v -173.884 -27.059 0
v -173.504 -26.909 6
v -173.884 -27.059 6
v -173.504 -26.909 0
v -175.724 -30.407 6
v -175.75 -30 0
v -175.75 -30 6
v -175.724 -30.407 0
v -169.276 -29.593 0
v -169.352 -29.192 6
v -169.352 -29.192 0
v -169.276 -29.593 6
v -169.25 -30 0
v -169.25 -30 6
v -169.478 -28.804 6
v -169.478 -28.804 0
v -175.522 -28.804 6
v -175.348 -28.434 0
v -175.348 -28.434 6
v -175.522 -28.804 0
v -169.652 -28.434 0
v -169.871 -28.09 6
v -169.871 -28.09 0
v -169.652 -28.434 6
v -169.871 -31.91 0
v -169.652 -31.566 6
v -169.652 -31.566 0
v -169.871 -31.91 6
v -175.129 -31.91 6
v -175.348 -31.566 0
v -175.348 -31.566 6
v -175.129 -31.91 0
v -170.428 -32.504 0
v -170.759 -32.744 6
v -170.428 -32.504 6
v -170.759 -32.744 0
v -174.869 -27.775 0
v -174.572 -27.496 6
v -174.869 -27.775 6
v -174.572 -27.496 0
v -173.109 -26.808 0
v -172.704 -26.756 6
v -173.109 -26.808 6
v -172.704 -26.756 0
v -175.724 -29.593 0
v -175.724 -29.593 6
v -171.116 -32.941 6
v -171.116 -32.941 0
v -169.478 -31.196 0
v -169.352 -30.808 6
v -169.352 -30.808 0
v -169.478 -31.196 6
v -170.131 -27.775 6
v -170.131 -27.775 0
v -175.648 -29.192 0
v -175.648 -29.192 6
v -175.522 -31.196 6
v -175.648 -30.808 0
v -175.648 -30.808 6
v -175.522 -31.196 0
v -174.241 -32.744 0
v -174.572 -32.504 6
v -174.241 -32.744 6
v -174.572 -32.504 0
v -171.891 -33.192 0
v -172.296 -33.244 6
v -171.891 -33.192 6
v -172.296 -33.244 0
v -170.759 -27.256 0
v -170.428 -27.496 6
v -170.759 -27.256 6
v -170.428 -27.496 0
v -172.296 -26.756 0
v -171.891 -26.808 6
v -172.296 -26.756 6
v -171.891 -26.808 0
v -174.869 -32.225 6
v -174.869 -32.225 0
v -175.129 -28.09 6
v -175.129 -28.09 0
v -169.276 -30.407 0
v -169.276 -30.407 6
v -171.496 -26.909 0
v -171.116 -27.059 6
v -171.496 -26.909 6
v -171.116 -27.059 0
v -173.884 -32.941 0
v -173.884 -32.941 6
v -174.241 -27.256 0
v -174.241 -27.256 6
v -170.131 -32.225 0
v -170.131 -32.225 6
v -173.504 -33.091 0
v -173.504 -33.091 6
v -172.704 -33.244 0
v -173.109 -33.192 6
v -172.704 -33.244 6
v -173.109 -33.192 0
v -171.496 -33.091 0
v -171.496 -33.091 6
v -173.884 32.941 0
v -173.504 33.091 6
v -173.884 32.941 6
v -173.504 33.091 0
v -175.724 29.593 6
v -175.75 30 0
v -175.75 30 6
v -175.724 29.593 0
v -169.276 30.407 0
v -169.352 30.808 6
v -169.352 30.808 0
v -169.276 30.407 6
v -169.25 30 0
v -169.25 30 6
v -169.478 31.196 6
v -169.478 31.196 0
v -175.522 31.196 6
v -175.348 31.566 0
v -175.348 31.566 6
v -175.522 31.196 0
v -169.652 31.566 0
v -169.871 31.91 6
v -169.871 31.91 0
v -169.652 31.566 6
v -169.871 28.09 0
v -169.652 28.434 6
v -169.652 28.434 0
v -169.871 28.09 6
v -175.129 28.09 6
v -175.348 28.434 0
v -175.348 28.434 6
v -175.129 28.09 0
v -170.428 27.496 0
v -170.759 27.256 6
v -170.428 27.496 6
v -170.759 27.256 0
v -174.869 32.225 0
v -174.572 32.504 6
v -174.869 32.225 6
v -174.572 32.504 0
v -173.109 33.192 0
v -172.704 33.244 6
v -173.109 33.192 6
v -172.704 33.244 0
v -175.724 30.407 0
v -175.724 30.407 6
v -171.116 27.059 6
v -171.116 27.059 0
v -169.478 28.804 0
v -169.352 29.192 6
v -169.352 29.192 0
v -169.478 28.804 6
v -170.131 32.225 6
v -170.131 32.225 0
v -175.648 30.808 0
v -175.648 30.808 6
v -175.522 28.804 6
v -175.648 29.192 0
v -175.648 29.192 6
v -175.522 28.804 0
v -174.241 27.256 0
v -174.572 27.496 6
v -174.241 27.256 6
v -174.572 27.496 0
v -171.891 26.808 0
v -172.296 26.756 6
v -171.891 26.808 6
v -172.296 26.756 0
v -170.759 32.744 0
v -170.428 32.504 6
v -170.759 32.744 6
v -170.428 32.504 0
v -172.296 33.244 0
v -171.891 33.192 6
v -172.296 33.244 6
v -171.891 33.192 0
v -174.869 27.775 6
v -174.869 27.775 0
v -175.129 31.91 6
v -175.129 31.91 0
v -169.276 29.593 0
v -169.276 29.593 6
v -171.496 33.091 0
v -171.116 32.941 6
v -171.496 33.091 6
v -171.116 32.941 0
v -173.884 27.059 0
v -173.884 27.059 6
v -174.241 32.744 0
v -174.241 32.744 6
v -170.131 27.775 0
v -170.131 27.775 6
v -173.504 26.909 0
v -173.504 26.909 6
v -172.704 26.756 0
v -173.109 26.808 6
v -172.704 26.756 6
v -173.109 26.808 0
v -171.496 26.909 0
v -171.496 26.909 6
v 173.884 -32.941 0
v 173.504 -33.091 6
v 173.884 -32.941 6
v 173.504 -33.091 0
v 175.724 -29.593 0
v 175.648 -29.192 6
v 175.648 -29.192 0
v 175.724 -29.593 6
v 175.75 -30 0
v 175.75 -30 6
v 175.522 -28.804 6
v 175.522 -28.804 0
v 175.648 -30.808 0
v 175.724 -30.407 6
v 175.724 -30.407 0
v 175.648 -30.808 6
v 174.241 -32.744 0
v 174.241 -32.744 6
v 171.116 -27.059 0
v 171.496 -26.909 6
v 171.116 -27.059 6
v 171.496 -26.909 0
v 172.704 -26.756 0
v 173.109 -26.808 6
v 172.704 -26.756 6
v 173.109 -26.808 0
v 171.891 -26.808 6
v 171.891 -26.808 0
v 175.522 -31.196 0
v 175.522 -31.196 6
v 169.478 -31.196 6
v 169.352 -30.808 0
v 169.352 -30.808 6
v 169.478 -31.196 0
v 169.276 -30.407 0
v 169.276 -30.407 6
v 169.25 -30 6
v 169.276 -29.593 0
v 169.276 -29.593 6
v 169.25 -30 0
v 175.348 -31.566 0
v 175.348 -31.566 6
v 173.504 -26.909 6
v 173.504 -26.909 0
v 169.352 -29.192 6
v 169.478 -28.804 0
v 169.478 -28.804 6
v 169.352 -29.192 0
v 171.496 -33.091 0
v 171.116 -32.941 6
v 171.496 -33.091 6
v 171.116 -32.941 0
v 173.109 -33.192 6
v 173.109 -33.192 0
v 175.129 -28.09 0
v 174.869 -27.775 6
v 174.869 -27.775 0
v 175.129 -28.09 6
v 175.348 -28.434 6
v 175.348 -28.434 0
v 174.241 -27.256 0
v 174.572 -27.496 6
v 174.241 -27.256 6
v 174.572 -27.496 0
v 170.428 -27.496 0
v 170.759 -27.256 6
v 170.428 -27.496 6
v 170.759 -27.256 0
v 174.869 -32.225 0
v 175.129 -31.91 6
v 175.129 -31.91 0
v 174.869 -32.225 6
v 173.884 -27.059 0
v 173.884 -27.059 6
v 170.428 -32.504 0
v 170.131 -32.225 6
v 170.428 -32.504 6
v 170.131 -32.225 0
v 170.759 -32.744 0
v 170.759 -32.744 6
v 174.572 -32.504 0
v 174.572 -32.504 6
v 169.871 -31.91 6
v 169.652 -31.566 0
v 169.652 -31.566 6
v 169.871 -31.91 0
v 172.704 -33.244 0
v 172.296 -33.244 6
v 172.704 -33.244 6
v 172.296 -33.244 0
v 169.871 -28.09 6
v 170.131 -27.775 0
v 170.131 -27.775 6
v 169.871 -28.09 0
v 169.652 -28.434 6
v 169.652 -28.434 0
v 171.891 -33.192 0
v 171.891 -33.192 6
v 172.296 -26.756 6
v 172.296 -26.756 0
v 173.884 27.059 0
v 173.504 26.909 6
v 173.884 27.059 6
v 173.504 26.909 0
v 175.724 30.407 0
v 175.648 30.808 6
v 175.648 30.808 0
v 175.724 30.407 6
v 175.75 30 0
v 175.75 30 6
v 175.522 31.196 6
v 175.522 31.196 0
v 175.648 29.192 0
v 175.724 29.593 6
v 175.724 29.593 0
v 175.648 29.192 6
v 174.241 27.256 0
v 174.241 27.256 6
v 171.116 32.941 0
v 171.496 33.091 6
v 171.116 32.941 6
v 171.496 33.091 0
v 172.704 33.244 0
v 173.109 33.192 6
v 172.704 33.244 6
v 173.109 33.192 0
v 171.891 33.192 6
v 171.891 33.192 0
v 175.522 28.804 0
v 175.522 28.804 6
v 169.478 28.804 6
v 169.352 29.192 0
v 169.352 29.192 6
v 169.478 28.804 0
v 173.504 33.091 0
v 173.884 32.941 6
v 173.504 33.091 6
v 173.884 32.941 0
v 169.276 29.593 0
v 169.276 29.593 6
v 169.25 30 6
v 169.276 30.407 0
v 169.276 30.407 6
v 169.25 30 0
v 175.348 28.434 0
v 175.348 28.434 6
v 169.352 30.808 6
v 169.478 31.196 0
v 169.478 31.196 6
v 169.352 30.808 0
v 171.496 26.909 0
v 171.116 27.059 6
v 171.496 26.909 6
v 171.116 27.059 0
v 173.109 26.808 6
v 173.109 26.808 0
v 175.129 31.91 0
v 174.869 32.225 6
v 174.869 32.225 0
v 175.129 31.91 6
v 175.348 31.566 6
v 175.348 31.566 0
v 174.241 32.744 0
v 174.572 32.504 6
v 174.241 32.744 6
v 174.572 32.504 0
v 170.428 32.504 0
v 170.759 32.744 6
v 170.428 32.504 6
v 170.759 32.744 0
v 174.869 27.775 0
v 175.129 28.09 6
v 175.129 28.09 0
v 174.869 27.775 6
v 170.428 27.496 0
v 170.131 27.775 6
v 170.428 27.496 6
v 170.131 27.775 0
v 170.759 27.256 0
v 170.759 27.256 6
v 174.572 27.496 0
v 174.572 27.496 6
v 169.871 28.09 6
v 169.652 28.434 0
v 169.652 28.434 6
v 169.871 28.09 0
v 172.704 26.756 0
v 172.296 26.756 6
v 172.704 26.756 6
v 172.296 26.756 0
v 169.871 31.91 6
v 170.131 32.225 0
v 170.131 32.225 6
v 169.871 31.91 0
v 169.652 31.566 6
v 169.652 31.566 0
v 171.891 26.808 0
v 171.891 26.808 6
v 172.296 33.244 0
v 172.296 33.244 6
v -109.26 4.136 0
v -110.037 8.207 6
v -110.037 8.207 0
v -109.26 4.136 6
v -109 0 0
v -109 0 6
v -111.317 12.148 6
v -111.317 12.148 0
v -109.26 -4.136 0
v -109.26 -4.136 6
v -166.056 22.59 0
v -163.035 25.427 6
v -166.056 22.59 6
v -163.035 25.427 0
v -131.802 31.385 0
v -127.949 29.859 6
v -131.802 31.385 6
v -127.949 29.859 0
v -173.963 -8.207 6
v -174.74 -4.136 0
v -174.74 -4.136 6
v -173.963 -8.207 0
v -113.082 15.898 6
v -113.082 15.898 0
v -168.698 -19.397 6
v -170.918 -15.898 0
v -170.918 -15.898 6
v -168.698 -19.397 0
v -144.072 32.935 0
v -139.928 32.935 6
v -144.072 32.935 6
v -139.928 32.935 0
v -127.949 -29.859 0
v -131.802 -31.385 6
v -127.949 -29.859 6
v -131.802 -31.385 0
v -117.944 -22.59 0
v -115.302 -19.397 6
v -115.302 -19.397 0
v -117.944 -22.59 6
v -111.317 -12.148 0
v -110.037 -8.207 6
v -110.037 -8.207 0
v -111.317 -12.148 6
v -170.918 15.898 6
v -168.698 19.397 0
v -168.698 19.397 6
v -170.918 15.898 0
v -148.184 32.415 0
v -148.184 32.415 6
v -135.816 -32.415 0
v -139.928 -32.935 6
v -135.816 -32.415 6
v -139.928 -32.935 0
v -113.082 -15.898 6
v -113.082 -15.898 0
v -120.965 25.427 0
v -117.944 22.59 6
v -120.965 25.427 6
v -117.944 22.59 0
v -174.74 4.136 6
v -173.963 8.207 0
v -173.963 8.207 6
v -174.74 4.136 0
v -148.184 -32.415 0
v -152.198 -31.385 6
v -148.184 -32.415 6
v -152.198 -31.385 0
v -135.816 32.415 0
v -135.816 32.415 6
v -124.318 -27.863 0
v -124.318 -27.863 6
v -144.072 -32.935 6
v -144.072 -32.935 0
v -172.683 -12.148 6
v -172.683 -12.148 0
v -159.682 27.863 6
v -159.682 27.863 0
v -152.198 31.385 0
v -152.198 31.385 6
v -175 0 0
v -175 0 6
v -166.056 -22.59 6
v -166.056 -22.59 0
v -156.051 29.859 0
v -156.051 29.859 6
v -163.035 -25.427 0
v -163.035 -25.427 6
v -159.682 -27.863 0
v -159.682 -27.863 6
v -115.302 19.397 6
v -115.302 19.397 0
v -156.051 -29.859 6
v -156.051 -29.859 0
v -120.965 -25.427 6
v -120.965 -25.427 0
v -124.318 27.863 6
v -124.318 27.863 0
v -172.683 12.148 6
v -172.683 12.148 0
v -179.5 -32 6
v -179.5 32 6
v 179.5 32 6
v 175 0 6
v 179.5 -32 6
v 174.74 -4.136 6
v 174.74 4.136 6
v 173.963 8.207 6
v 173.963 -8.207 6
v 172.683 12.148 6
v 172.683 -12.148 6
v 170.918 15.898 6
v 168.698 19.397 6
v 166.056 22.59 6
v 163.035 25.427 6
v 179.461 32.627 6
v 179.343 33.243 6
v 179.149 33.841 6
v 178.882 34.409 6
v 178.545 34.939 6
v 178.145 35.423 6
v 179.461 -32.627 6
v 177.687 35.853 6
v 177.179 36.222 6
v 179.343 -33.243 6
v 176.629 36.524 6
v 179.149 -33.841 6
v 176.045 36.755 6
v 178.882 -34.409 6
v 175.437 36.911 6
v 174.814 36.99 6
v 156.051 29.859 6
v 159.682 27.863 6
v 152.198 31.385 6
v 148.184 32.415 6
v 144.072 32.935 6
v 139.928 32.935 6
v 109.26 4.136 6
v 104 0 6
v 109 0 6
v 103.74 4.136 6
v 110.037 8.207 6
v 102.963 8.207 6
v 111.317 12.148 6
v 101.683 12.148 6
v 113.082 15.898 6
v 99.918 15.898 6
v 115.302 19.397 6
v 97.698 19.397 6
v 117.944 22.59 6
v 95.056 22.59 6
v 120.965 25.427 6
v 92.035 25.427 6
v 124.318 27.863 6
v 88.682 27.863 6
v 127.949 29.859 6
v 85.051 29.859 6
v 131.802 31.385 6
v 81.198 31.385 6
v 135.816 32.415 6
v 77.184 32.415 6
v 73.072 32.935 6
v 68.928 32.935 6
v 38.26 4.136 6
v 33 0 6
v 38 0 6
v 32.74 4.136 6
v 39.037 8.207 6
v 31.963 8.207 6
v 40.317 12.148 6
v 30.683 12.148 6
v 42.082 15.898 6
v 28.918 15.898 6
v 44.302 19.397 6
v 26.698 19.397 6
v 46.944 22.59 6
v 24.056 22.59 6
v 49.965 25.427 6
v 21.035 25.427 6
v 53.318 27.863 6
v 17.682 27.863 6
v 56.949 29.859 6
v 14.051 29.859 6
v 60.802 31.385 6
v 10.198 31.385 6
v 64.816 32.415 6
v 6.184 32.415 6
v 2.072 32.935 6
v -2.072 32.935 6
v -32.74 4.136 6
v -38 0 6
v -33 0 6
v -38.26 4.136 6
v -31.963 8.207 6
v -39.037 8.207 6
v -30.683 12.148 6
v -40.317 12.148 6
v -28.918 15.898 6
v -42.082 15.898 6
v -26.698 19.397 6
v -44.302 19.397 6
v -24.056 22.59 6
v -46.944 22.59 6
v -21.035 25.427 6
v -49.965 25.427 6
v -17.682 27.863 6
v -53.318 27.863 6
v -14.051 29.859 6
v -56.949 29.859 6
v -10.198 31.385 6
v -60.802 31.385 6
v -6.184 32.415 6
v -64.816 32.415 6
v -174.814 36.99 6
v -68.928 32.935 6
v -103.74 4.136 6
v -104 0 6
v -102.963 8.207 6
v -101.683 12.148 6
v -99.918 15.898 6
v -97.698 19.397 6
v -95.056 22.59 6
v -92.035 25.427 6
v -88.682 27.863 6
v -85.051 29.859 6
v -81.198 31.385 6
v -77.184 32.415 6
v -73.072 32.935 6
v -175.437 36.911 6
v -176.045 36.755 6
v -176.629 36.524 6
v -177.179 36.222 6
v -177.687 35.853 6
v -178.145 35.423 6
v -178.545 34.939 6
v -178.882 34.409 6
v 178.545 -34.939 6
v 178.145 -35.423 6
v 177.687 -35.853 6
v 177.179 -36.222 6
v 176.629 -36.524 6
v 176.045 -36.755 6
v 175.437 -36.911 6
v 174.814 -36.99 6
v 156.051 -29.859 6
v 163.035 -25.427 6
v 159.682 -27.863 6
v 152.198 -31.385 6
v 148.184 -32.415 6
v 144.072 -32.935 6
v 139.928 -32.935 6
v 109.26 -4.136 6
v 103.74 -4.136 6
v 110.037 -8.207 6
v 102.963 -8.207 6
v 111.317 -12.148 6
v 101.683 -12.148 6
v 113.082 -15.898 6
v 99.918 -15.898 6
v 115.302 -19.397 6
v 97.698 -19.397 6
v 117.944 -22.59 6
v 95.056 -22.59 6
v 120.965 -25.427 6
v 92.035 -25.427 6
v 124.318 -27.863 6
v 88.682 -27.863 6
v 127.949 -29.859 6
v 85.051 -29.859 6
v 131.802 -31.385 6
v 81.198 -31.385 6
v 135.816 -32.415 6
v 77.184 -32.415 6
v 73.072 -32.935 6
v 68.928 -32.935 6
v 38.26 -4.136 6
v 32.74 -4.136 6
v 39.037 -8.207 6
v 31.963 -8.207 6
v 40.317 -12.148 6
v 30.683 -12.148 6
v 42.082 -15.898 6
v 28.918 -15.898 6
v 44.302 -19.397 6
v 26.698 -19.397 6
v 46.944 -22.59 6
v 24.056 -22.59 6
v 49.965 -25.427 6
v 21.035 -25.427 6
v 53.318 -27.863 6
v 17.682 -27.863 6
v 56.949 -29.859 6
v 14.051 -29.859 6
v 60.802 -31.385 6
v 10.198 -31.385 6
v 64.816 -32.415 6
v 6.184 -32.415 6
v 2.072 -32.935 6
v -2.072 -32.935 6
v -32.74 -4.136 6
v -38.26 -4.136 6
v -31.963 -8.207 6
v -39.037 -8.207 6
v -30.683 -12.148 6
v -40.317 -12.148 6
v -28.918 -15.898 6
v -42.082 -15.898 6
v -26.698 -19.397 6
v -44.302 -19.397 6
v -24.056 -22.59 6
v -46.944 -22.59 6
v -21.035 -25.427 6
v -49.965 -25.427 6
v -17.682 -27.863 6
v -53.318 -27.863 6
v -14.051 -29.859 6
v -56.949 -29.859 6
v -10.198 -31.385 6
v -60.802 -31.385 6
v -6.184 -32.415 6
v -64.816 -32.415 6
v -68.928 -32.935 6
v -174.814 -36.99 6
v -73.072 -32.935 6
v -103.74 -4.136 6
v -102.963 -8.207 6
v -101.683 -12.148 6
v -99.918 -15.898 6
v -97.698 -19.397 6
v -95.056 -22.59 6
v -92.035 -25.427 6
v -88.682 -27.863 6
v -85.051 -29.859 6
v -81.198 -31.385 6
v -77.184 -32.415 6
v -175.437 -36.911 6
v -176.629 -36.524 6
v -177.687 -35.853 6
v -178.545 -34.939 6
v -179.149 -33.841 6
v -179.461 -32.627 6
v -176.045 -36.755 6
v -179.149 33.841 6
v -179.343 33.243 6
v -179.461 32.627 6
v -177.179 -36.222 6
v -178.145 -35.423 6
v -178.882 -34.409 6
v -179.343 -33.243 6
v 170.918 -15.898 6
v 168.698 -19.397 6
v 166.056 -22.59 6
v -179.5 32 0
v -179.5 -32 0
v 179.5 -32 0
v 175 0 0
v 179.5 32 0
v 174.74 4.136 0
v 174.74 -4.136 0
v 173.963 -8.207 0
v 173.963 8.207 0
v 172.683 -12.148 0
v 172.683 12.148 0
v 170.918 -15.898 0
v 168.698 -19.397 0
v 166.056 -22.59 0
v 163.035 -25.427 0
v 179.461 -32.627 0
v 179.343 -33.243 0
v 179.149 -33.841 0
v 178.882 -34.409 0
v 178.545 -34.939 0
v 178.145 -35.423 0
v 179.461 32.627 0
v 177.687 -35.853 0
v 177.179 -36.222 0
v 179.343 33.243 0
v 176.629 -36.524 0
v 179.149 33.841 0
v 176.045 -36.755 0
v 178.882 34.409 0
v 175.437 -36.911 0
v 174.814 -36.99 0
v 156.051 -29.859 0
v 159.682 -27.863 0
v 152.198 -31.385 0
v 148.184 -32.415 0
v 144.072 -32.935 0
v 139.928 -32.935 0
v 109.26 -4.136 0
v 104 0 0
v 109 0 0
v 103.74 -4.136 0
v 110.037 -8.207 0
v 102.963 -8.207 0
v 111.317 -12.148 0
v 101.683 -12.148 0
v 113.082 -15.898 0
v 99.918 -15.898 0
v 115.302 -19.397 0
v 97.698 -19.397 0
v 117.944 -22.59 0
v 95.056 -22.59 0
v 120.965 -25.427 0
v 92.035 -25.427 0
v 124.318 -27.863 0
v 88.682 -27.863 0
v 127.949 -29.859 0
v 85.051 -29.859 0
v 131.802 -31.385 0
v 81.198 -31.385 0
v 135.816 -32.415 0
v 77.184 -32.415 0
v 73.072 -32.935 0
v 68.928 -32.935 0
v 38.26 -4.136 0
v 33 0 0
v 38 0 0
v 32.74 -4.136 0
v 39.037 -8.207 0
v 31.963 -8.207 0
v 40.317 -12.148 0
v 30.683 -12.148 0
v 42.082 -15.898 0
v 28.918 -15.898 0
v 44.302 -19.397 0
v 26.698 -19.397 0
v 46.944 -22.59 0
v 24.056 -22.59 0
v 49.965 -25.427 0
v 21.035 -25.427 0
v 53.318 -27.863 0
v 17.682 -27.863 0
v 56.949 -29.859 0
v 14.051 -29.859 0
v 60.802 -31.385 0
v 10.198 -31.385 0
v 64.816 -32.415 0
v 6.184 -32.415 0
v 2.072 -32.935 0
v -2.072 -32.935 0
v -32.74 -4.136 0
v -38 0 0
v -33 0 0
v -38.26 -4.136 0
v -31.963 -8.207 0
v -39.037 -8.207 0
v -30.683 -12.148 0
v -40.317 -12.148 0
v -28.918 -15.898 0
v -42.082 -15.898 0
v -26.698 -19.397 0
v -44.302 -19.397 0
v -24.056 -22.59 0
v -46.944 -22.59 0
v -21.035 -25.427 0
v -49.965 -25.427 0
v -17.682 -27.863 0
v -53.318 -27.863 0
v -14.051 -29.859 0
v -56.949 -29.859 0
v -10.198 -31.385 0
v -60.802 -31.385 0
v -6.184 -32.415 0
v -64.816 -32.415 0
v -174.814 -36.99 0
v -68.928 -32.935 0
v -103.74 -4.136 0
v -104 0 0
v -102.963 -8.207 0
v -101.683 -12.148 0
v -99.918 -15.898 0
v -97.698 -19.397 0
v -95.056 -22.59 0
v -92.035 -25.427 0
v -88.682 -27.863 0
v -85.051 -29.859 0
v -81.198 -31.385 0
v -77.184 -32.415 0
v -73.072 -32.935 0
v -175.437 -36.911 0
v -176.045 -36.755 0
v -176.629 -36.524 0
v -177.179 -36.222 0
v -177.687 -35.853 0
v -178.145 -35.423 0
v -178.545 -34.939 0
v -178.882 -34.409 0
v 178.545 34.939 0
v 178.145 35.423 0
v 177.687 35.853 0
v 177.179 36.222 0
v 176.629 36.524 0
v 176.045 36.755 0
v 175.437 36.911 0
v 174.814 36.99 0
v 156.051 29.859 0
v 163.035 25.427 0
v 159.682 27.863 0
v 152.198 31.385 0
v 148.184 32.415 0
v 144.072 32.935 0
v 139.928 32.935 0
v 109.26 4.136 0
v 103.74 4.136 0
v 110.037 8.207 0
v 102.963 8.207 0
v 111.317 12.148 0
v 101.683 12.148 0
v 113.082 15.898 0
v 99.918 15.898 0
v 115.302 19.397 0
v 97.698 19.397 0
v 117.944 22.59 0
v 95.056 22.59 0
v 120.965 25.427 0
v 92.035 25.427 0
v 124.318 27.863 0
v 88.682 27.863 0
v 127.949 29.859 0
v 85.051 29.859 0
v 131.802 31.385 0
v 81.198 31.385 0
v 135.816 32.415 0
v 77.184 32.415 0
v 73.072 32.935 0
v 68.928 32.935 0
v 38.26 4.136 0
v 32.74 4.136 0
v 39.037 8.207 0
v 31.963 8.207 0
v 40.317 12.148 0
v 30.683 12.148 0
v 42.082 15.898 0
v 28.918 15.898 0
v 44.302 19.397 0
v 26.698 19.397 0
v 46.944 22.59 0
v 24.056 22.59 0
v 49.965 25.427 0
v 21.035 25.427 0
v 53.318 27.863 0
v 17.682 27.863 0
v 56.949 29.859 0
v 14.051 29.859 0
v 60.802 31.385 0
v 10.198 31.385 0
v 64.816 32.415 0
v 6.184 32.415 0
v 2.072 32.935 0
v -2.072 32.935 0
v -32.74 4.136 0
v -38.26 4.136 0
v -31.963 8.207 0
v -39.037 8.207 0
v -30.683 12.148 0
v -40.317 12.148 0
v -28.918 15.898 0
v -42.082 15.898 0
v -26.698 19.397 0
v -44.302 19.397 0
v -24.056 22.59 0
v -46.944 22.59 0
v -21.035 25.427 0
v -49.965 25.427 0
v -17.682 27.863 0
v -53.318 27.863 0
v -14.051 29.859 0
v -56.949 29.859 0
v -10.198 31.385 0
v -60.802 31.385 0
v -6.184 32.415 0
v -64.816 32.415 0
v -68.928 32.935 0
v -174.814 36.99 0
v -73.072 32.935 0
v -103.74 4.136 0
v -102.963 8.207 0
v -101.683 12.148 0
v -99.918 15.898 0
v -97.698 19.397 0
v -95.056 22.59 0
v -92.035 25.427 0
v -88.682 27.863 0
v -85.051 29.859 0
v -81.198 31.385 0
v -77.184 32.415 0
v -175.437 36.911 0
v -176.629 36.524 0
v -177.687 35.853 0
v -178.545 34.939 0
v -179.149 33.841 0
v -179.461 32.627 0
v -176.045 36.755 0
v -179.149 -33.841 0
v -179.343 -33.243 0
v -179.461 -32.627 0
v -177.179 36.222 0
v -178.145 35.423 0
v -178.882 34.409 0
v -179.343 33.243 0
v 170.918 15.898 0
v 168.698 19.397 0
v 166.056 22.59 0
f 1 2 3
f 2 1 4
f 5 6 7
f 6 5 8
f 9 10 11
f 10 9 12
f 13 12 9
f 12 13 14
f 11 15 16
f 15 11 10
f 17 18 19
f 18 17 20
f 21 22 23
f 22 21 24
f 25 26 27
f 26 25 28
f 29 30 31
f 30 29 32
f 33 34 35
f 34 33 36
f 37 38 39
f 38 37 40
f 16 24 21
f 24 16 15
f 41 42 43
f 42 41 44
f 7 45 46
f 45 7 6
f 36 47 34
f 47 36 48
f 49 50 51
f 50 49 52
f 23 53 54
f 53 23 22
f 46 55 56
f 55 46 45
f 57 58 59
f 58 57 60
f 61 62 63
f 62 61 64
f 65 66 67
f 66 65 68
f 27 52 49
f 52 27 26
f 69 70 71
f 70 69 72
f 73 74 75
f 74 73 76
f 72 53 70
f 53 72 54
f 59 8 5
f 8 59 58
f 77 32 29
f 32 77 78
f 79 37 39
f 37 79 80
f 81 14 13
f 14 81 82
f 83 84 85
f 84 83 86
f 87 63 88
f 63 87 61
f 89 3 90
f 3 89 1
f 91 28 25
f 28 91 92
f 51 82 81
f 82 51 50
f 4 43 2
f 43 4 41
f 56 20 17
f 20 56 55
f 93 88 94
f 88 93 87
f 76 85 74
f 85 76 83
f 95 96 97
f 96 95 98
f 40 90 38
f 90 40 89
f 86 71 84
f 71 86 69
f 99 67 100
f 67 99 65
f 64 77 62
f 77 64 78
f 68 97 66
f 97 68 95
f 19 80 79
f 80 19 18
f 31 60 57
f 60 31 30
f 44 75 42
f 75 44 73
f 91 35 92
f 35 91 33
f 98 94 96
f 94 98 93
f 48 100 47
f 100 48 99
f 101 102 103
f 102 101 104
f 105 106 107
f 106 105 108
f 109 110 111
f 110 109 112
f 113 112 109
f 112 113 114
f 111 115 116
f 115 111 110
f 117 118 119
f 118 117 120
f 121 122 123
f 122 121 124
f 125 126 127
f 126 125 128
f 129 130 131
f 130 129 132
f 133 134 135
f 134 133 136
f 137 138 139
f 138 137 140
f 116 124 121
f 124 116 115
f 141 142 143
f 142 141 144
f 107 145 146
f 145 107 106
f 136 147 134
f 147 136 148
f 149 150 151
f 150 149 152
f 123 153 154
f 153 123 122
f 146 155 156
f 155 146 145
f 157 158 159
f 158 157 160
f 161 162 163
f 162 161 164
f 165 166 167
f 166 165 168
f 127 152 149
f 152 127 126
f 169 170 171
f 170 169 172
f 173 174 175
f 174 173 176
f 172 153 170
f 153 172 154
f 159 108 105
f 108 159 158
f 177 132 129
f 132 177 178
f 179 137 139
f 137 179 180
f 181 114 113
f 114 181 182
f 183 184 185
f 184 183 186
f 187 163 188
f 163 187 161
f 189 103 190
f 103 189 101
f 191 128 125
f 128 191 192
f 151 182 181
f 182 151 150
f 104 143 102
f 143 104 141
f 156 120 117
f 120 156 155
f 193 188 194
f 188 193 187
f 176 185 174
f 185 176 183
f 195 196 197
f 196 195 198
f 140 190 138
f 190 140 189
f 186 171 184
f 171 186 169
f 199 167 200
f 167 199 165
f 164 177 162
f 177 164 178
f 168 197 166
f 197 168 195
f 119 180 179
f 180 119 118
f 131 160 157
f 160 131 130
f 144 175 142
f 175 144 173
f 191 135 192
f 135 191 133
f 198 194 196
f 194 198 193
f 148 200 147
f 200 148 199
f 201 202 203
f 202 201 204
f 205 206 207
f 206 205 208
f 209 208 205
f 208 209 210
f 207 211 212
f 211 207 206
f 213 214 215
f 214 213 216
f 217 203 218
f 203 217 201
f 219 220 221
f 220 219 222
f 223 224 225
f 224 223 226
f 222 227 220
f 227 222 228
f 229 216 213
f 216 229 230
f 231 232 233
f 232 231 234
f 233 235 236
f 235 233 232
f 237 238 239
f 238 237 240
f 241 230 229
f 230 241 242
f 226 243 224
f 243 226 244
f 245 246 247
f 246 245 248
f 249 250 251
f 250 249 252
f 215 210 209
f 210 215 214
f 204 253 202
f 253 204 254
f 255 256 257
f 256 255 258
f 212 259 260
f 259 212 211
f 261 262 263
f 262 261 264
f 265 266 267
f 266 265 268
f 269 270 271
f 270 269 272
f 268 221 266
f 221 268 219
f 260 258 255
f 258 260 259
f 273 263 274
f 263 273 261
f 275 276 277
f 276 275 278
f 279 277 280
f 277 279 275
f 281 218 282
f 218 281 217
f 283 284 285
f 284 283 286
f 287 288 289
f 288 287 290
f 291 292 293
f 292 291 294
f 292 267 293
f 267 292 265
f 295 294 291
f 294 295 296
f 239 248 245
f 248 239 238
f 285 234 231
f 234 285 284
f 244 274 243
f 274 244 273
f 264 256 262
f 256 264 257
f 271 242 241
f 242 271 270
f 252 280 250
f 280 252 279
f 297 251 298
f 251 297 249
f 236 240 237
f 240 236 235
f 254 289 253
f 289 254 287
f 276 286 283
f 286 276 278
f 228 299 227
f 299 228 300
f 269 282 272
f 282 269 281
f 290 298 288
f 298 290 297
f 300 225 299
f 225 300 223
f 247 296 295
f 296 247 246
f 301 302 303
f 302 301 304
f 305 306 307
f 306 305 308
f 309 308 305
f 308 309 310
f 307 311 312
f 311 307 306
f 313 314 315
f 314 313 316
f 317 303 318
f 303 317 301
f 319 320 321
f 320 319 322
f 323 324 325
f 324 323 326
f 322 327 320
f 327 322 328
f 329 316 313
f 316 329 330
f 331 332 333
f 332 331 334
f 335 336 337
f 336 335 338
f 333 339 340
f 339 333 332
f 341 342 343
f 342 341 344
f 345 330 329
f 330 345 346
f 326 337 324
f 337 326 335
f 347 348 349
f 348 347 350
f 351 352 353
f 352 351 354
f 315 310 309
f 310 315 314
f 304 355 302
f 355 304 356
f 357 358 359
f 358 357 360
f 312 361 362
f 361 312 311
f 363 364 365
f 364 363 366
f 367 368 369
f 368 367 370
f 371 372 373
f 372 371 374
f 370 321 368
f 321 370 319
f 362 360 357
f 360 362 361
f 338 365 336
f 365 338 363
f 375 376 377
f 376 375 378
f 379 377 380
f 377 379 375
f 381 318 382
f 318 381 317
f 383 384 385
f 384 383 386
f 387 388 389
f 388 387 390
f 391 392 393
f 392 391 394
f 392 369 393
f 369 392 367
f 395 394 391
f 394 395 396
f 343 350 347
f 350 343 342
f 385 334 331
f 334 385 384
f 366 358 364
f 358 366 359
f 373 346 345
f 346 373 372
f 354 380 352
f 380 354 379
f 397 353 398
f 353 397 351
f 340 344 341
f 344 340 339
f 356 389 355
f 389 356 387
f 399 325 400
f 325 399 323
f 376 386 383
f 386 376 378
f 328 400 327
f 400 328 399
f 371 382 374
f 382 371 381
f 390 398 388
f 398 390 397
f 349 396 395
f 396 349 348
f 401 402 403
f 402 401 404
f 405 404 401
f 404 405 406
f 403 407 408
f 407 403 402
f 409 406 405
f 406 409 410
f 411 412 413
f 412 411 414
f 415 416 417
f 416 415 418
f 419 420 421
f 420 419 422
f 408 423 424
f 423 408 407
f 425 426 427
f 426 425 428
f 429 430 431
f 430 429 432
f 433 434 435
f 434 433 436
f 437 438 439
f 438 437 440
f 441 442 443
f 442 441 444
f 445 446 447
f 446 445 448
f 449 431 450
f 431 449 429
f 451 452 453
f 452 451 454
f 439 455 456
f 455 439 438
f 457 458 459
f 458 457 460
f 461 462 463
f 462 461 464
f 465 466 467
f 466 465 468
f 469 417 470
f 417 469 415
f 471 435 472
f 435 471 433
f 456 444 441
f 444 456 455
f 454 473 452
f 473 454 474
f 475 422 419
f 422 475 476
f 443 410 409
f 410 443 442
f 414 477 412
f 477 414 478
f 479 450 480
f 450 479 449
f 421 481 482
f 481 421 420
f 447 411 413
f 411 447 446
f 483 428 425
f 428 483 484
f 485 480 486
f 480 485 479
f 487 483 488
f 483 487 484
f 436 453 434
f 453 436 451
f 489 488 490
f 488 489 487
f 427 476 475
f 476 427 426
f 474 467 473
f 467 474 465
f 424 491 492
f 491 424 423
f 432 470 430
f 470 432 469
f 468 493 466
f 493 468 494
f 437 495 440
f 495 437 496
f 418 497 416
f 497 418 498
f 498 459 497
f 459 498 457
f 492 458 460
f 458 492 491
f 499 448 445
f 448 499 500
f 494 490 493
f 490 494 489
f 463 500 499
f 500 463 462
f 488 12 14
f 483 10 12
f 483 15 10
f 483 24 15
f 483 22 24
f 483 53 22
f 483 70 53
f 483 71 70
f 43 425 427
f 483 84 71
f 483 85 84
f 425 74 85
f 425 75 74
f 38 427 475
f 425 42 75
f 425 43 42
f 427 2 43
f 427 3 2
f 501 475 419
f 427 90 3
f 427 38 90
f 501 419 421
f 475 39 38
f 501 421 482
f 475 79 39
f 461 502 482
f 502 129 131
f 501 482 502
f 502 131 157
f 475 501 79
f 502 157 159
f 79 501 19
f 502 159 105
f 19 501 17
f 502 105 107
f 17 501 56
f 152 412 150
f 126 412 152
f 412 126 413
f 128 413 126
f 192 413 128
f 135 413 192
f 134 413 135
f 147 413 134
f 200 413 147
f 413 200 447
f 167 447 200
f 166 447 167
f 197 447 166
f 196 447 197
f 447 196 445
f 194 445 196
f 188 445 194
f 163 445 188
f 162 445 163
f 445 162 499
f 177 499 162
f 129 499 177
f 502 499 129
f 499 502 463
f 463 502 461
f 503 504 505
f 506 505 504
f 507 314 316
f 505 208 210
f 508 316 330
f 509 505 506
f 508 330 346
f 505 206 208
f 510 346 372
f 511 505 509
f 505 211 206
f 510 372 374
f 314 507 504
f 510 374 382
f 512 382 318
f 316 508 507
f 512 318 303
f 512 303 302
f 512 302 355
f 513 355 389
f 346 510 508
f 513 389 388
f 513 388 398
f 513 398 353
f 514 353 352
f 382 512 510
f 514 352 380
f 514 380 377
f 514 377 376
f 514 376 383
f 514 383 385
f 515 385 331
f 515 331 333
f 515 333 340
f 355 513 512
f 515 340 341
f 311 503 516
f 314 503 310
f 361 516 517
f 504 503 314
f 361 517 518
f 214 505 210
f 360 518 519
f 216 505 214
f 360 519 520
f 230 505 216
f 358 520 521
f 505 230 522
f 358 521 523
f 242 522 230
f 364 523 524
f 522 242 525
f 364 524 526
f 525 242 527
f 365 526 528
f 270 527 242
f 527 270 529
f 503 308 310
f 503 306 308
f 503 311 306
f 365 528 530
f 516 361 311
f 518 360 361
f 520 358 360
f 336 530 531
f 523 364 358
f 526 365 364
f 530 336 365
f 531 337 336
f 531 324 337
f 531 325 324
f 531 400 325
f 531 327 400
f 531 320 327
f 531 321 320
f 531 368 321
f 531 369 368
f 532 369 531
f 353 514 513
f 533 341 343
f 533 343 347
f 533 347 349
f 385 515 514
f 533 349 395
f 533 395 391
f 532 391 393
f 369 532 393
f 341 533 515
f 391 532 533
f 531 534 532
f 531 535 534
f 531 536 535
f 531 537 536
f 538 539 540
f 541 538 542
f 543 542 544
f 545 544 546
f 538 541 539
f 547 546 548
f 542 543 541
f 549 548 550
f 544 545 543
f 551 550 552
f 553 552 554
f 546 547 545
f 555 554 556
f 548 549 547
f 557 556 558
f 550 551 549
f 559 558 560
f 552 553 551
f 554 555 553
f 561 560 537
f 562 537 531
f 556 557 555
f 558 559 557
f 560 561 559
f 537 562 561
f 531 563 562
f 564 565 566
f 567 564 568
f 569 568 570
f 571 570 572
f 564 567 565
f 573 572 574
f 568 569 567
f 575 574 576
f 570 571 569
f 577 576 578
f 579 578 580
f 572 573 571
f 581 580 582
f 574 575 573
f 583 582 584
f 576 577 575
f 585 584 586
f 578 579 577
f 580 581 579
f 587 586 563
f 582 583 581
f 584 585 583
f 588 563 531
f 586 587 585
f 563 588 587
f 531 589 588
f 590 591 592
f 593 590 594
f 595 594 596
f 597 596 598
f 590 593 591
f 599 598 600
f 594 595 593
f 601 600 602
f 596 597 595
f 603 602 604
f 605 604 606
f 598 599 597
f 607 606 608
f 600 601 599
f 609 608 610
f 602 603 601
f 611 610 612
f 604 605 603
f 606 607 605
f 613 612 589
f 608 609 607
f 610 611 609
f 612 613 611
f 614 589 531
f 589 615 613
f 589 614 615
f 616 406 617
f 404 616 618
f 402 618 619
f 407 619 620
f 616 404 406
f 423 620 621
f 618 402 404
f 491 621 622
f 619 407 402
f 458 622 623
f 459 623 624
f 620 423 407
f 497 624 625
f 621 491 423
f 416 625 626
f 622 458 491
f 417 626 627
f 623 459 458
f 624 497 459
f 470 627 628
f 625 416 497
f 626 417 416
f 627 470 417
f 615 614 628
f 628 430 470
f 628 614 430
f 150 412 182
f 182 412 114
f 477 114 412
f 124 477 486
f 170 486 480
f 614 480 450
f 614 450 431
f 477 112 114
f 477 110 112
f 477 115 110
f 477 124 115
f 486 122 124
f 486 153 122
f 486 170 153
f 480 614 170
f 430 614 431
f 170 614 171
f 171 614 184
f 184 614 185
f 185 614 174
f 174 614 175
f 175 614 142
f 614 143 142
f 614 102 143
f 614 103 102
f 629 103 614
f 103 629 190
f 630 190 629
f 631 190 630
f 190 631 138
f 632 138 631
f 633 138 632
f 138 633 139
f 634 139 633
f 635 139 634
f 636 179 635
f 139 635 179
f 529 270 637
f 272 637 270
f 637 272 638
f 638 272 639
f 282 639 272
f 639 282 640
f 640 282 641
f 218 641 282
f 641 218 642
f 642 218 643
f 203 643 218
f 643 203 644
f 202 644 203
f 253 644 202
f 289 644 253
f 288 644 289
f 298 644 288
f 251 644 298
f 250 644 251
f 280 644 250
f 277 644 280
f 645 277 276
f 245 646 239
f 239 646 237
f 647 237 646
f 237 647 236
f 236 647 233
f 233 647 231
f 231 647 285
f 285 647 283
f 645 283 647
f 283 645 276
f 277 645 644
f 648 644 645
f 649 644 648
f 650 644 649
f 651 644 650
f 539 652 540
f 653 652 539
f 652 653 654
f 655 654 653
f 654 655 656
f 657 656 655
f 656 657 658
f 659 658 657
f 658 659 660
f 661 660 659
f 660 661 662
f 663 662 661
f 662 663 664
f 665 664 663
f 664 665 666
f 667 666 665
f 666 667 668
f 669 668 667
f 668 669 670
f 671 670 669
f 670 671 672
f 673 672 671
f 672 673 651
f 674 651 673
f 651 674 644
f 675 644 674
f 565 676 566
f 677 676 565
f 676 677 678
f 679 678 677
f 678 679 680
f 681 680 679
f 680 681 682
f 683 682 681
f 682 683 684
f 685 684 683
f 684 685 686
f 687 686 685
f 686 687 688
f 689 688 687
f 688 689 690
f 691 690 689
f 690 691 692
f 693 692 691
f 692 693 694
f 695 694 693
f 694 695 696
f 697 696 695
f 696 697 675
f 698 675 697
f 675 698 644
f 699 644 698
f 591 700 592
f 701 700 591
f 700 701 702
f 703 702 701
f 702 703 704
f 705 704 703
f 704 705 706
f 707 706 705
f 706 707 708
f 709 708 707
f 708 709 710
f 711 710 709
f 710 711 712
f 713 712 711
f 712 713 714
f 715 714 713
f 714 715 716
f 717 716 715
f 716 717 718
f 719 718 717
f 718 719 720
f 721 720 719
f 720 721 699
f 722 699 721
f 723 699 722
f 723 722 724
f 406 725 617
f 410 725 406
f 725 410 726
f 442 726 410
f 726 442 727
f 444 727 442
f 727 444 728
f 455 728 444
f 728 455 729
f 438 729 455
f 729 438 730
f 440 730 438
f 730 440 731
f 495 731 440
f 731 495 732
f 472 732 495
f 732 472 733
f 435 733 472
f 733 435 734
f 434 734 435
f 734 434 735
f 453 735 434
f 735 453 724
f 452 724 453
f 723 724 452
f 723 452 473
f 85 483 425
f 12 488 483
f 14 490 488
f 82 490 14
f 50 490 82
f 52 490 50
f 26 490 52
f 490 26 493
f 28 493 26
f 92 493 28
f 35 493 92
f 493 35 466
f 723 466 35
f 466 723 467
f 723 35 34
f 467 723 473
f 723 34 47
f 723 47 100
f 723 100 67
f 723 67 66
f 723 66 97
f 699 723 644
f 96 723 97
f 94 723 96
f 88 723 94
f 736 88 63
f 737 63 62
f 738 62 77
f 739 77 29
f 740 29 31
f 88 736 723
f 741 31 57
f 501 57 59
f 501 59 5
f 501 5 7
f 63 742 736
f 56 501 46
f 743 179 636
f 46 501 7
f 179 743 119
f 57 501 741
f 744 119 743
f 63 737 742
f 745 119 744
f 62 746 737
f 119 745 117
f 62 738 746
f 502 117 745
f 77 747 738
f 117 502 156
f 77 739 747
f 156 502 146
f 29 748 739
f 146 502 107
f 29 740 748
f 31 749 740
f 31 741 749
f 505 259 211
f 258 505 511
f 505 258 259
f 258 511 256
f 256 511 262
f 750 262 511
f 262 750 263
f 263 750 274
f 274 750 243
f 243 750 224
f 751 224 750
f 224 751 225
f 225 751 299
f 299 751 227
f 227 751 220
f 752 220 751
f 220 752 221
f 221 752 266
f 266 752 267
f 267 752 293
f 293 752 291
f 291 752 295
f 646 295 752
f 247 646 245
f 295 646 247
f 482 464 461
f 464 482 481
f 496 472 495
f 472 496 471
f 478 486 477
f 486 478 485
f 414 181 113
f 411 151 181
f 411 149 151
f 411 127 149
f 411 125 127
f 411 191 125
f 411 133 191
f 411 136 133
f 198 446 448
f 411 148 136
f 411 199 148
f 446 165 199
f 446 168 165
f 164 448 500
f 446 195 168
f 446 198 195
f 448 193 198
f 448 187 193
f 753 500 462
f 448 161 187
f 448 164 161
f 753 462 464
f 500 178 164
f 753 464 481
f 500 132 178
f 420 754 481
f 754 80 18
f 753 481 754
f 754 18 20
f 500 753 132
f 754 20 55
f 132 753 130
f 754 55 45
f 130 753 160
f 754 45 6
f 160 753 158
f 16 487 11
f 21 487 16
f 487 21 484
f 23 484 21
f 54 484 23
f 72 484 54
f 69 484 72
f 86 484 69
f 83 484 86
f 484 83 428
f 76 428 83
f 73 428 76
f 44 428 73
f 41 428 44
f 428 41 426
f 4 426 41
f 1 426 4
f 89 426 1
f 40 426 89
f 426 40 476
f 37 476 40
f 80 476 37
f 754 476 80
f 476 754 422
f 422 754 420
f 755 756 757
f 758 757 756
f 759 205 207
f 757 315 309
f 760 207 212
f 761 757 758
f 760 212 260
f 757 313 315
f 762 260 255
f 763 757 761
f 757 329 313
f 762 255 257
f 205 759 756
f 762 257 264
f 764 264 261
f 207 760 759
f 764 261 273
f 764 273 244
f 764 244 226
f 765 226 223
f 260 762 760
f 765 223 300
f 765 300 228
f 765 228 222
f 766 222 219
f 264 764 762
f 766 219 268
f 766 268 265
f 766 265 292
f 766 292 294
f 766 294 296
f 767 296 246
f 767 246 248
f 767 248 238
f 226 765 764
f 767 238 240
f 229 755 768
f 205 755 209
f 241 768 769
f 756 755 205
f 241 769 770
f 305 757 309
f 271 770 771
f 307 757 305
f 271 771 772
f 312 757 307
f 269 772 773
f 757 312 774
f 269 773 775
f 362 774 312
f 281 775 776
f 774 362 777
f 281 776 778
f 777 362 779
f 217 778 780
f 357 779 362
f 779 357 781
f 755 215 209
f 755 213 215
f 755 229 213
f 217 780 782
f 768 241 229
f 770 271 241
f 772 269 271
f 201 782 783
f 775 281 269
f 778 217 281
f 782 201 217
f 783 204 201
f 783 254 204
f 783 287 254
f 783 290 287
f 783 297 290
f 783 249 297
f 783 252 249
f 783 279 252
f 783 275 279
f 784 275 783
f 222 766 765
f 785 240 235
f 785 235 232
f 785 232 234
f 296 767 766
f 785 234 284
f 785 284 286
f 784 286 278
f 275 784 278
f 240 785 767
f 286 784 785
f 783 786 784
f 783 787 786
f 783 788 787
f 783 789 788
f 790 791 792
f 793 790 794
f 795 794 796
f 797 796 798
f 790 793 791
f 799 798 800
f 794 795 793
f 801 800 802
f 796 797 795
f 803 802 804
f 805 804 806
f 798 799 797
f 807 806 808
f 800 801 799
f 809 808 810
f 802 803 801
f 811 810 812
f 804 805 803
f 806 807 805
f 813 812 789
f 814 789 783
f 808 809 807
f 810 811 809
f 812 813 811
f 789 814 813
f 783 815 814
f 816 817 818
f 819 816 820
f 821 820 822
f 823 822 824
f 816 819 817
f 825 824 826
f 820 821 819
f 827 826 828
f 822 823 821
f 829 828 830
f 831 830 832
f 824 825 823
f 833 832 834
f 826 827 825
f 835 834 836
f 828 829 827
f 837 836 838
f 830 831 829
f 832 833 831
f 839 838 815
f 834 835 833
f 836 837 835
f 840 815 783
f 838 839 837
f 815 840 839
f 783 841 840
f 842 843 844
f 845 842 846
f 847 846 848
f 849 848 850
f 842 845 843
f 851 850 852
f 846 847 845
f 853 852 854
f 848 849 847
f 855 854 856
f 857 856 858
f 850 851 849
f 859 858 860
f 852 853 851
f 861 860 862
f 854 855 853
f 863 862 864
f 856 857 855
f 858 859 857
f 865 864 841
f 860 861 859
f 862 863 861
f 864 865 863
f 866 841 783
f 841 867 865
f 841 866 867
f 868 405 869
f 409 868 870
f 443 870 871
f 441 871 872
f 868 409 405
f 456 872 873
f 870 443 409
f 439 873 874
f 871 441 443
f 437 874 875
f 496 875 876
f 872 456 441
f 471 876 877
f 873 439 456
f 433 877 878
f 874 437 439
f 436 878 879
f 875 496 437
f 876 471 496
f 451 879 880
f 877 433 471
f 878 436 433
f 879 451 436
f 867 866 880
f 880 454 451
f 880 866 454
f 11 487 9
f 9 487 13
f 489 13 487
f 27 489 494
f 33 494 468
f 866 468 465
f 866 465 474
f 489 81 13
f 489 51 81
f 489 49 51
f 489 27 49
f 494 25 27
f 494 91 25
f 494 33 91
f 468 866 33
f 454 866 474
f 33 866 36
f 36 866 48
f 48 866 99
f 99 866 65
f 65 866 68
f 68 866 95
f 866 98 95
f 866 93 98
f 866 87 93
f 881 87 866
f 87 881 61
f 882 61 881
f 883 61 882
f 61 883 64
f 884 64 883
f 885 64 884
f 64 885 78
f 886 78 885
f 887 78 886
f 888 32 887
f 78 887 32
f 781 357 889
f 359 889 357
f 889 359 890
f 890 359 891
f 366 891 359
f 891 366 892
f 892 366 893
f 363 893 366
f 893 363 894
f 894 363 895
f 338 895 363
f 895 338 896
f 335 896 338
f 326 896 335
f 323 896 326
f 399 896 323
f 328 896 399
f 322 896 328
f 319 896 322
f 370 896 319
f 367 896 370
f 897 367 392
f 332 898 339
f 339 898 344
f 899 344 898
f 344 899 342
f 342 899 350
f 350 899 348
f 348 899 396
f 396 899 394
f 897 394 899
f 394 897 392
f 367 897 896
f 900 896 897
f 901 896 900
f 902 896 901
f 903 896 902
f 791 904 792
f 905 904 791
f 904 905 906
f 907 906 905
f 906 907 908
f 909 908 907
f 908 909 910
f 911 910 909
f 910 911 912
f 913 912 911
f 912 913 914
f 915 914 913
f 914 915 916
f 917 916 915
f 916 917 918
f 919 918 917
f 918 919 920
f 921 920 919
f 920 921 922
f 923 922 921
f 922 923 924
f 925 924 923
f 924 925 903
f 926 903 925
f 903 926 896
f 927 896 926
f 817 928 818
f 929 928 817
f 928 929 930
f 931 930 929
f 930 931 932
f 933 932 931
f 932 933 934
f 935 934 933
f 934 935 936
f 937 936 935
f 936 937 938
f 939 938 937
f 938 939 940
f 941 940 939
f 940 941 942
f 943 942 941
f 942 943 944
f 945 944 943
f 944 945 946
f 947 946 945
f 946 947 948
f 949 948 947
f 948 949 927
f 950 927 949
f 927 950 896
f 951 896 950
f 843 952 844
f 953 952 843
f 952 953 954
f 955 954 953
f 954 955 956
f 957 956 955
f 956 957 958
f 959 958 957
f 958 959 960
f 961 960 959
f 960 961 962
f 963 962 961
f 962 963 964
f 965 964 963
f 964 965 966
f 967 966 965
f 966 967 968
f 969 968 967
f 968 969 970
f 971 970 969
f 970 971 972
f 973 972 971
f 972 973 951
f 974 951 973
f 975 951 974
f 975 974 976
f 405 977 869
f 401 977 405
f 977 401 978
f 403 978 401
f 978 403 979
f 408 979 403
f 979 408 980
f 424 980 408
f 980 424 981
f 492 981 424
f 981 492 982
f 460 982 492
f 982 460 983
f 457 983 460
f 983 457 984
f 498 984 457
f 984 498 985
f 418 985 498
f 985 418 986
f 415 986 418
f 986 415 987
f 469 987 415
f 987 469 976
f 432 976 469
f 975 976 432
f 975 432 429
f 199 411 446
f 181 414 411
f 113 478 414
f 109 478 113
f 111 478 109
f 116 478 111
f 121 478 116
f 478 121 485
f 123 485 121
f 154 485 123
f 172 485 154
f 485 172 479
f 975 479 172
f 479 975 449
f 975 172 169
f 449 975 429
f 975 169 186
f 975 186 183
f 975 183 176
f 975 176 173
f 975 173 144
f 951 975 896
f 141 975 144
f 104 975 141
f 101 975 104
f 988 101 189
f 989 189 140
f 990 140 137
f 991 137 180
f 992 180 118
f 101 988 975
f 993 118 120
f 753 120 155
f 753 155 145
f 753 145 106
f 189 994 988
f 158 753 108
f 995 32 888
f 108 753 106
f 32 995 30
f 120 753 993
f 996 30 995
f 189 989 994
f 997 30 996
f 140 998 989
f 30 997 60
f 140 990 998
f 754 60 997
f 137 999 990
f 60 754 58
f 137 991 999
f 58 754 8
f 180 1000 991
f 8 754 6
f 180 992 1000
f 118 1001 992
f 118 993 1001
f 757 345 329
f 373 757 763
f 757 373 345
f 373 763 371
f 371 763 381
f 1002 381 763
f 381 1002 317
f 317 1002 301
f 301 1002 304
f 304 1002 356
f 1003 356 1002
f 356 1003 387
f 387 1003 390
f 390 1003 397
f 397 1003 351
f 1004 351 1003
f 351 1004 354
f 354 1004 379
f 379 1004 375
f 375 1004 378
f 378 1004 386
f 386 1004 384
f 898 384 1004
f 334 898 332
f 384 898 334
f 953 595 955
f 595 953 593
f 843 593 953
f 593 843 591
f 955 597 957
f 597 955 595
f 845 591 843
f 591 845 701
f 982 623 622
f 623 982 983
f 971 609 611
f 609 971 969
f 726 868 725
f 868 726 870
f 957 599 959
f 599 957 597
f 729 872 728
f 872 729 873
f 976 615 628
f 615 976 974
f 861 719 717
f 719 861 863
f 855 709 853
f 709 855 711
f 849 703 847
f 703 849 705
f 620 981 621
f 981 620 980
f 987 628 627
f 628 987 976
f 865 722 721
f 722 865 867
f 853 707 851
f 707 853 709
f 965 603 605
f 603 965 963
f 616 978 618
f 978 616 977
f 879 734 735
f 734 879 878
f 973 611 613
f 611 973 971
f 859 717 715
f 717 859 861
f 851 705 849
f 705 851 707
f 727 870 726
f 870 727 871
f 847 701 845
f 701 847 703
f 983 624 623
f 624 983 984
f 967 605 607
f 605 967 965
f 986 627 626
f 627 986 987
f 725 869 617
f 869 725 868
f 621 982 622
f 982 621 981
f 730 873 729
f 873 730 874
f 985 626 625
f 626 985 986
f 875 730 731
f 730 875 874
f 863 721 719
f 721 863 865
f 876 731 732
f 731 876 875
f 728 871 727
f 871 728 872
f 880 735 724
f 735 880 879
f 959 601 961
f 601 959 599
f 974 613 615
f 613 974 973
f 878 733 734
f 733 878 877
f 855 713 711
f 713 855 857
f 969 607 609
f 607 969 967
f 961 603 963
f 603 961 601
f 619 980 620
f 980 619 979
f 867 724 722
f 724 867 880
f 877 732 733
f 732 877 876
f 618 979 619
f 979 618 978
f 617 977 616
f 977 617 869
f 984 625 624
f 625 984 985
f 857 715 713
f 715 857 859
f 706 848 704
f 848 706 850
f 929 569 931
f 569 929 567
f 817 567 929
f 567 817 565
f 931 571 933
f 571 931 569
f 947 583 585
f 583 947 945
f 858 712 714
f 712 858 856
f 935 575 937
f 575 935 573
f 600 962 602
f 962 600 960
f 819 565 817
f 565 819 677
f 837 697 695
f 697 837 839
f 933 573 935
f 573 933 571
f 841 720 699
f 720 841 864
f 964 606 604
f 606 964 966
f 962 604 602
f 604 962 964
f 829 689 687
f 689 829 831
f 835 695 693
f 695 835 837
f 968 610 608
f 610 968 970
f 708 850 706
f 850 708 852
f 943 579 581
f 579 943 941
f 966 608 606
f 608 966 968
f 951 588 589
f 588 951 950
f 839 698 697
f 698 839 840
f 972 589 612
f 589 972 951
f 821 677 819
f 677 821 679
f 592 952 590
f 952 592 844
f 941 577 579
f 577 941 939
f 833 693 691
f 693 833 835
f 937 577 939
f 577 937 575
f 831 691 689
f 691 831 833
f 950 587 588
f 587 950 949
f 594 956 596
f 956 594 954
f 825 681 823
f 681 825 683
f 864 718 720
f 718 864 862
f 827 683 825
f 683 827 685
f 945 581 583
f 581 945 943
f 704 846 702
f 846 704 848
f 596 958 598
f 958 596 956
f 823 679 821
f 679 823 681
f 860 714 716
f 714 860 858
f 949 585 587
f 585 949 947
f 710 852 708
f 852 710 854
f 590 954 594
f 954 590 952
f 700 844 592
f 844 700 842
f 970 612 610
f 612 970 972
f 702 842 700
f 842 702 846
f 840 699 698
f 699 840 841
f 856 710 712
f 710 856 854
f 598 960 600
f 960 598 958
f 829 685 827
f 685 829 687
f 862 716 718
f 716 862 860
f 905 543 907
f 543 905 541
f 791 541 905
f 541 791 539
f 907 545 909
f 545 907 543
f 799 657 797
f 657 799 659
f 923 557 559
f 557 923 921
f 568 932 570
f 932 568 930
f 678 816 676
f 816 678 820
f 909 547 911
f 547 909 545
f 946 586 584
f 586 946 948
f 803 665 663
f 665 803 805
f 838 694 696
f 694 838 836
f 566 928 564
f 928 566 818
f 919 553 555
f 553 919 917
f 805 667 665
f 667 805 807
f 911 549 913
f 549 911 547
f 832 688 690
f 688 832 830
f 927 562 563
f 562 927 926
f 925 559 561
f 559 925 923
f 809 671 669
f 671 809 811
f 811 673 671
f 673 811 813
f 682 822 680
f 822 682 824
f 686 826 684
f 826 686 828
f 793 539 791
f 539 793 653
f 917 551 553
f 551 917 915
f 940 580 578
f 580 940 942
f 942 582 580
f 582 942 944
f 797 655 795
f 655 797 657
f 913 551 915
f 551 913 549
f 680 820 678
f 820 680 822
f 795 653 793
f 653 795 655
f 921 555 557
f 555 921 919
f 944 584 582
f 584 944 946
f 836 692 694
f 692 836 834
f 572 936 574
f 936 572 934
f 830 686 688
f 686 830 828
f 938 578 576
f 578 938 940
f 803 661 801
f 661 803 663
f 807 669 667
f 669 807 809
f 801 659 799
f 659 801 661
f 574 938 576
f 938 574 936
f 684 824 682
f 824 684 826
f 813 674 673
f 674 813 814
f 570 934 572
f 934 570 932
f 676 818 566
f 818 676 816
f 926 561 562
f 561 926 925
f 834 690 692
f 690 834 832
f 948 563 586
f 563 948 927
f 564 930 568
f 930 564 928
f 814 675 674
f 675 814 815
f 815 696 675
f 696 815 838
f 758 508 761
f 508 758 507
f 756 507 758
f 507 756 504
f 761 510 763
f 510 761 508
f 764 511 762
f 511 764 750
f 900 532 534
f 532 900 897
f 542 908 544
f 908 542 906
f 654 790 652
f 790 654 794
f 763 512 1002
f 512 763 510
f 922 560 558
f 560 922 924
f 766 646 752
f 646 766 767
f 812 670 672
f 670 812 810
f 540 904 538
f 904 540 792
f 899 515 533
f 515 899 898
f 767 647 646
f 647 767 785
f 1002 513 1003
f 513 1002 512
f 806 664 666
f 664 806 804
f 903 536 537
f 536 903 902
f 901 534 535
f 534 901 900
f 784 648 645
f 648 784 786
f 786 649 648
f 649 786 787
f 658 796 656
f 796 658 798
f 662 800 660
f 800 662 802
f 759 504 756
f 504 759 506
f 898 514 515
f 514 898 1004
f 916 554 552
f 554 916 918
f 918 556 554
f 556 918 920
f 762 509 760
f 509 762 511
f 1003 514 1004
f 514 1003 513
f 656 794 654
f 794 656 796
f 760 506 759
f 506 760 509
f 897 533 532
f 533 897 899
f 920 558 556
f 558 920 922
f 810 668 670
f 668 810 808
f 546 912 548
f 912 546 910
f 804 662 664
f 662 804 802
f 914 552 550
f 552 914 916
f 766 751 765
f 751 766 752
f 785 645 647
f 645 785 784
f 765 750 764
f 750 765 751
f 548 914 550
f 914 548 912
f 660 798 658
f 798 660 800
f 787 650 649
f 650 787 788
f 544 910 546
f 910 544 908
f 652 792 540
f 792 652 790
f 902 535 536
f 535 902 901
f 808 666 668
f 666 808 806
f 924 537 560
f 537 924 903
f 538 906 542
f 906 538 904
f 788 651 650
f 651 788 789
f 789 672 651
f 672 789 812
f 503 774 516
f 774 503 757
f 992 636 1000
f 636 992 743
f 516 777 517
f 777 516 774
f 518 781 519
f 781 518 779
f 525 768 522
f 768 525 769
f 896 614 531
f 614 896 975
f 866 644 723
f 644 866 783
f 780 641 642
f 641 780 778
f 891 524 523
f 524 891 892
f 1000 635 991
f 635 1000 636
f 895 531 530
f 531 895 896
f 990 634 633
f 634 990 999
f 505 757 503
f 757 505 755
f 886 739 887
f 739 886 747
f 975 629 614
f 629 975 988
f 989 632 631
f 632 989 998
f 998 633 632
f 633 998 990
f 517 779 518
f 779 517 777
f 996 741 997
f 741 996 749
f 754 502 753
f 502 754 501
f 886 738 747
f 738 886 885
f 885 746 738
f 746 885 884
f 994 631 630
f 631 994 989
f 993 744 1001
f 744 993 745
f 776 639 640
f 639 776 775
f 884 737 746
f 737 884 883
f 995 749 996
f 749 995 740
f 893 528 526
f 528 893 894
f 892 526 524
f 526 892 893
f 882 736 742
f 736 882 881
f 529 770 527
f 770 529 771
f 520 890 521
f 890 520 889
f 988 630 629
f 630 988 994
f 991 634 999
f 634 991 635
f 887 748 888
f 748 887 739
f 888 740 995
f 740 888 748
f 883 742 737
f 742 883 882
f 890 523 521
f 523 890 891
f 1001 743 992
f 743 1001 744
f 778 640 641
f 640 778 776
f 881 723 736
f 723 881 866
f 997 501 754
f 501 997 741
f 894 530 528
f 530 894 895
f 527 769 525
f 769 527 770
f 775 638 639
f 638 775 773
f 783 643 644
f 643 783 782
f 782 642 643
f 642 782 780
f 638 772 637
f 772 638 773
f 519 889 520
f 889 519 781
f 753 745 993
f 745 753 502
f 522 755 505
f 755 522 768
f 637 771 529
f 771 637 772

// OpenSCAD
$fn = 50;

difference() {
	union() {
		hull() {
			translate(v = [-174.5, 32.0, 0]) {
				cylinder(h = 6, r = 5);
			}
			translate(v = [174.5, 32.0, 0]) {
				cylinder(h = 6, r = 5);
			}
			translate(v = [-174.5, -32.0, 0]) {
				cylinder(h = 6, r = 5);
			}
			translate(v = [174.5, -32.0, 0]) {
				cylinder(h = 6, r = 5);
			}
		}
	}
	union() {
		translate(v = [-172.5, -30.0, -100.0]) {
			cylinder(h = 200, r = 3.25);
		}
		translate(v = [-172.5, 30.0, -100.0]) {
			cylinder(h = 200, r = 3.25);
		}
		translate(v = [172.5, -30.0, -100.0]) {
			cylinder(h = 200, r = 3.25);
		}
		translate(v = [172.5, 30.0, -100.0]) {
			cylinder(h = 200, r = 3.25);
		}
		translate(v = [-172.5, -30.0, -100.0]) {
			cylinder(h = 200, r = 1.8);
		}
		translate(v = [-172.5, 30.0, -100.0]) {
			cylinder(h = 200, r = 1.8);
		}
		translate(v = [172.5, -30.0, -100.0]) {
			cylinder(h = 200, r = 1.8);
		}
		translate(v = [172.5, 30.0, -100.0]) {
			cylinder(h = 200, r = 1.8);
		}
		translate(v = [-142.0, 0, 0.0]) {
			cylinder(h = 6, r = 33.0);
		}
		translate(v = [-71.0, 0, 0.0]) {
			cylinder(h = 6, r = 33.0);
		}
		cylinder(h = 6, r = 33.0);
		translate(v = [71.0, 0, 0.0]) {
			cylinder(h = 6, r = 33.0);
		}
		translate(v = [142.0, 0, 0.0]) {
			cylinder(h = 6, r = 33.0);
		}
	}
}
